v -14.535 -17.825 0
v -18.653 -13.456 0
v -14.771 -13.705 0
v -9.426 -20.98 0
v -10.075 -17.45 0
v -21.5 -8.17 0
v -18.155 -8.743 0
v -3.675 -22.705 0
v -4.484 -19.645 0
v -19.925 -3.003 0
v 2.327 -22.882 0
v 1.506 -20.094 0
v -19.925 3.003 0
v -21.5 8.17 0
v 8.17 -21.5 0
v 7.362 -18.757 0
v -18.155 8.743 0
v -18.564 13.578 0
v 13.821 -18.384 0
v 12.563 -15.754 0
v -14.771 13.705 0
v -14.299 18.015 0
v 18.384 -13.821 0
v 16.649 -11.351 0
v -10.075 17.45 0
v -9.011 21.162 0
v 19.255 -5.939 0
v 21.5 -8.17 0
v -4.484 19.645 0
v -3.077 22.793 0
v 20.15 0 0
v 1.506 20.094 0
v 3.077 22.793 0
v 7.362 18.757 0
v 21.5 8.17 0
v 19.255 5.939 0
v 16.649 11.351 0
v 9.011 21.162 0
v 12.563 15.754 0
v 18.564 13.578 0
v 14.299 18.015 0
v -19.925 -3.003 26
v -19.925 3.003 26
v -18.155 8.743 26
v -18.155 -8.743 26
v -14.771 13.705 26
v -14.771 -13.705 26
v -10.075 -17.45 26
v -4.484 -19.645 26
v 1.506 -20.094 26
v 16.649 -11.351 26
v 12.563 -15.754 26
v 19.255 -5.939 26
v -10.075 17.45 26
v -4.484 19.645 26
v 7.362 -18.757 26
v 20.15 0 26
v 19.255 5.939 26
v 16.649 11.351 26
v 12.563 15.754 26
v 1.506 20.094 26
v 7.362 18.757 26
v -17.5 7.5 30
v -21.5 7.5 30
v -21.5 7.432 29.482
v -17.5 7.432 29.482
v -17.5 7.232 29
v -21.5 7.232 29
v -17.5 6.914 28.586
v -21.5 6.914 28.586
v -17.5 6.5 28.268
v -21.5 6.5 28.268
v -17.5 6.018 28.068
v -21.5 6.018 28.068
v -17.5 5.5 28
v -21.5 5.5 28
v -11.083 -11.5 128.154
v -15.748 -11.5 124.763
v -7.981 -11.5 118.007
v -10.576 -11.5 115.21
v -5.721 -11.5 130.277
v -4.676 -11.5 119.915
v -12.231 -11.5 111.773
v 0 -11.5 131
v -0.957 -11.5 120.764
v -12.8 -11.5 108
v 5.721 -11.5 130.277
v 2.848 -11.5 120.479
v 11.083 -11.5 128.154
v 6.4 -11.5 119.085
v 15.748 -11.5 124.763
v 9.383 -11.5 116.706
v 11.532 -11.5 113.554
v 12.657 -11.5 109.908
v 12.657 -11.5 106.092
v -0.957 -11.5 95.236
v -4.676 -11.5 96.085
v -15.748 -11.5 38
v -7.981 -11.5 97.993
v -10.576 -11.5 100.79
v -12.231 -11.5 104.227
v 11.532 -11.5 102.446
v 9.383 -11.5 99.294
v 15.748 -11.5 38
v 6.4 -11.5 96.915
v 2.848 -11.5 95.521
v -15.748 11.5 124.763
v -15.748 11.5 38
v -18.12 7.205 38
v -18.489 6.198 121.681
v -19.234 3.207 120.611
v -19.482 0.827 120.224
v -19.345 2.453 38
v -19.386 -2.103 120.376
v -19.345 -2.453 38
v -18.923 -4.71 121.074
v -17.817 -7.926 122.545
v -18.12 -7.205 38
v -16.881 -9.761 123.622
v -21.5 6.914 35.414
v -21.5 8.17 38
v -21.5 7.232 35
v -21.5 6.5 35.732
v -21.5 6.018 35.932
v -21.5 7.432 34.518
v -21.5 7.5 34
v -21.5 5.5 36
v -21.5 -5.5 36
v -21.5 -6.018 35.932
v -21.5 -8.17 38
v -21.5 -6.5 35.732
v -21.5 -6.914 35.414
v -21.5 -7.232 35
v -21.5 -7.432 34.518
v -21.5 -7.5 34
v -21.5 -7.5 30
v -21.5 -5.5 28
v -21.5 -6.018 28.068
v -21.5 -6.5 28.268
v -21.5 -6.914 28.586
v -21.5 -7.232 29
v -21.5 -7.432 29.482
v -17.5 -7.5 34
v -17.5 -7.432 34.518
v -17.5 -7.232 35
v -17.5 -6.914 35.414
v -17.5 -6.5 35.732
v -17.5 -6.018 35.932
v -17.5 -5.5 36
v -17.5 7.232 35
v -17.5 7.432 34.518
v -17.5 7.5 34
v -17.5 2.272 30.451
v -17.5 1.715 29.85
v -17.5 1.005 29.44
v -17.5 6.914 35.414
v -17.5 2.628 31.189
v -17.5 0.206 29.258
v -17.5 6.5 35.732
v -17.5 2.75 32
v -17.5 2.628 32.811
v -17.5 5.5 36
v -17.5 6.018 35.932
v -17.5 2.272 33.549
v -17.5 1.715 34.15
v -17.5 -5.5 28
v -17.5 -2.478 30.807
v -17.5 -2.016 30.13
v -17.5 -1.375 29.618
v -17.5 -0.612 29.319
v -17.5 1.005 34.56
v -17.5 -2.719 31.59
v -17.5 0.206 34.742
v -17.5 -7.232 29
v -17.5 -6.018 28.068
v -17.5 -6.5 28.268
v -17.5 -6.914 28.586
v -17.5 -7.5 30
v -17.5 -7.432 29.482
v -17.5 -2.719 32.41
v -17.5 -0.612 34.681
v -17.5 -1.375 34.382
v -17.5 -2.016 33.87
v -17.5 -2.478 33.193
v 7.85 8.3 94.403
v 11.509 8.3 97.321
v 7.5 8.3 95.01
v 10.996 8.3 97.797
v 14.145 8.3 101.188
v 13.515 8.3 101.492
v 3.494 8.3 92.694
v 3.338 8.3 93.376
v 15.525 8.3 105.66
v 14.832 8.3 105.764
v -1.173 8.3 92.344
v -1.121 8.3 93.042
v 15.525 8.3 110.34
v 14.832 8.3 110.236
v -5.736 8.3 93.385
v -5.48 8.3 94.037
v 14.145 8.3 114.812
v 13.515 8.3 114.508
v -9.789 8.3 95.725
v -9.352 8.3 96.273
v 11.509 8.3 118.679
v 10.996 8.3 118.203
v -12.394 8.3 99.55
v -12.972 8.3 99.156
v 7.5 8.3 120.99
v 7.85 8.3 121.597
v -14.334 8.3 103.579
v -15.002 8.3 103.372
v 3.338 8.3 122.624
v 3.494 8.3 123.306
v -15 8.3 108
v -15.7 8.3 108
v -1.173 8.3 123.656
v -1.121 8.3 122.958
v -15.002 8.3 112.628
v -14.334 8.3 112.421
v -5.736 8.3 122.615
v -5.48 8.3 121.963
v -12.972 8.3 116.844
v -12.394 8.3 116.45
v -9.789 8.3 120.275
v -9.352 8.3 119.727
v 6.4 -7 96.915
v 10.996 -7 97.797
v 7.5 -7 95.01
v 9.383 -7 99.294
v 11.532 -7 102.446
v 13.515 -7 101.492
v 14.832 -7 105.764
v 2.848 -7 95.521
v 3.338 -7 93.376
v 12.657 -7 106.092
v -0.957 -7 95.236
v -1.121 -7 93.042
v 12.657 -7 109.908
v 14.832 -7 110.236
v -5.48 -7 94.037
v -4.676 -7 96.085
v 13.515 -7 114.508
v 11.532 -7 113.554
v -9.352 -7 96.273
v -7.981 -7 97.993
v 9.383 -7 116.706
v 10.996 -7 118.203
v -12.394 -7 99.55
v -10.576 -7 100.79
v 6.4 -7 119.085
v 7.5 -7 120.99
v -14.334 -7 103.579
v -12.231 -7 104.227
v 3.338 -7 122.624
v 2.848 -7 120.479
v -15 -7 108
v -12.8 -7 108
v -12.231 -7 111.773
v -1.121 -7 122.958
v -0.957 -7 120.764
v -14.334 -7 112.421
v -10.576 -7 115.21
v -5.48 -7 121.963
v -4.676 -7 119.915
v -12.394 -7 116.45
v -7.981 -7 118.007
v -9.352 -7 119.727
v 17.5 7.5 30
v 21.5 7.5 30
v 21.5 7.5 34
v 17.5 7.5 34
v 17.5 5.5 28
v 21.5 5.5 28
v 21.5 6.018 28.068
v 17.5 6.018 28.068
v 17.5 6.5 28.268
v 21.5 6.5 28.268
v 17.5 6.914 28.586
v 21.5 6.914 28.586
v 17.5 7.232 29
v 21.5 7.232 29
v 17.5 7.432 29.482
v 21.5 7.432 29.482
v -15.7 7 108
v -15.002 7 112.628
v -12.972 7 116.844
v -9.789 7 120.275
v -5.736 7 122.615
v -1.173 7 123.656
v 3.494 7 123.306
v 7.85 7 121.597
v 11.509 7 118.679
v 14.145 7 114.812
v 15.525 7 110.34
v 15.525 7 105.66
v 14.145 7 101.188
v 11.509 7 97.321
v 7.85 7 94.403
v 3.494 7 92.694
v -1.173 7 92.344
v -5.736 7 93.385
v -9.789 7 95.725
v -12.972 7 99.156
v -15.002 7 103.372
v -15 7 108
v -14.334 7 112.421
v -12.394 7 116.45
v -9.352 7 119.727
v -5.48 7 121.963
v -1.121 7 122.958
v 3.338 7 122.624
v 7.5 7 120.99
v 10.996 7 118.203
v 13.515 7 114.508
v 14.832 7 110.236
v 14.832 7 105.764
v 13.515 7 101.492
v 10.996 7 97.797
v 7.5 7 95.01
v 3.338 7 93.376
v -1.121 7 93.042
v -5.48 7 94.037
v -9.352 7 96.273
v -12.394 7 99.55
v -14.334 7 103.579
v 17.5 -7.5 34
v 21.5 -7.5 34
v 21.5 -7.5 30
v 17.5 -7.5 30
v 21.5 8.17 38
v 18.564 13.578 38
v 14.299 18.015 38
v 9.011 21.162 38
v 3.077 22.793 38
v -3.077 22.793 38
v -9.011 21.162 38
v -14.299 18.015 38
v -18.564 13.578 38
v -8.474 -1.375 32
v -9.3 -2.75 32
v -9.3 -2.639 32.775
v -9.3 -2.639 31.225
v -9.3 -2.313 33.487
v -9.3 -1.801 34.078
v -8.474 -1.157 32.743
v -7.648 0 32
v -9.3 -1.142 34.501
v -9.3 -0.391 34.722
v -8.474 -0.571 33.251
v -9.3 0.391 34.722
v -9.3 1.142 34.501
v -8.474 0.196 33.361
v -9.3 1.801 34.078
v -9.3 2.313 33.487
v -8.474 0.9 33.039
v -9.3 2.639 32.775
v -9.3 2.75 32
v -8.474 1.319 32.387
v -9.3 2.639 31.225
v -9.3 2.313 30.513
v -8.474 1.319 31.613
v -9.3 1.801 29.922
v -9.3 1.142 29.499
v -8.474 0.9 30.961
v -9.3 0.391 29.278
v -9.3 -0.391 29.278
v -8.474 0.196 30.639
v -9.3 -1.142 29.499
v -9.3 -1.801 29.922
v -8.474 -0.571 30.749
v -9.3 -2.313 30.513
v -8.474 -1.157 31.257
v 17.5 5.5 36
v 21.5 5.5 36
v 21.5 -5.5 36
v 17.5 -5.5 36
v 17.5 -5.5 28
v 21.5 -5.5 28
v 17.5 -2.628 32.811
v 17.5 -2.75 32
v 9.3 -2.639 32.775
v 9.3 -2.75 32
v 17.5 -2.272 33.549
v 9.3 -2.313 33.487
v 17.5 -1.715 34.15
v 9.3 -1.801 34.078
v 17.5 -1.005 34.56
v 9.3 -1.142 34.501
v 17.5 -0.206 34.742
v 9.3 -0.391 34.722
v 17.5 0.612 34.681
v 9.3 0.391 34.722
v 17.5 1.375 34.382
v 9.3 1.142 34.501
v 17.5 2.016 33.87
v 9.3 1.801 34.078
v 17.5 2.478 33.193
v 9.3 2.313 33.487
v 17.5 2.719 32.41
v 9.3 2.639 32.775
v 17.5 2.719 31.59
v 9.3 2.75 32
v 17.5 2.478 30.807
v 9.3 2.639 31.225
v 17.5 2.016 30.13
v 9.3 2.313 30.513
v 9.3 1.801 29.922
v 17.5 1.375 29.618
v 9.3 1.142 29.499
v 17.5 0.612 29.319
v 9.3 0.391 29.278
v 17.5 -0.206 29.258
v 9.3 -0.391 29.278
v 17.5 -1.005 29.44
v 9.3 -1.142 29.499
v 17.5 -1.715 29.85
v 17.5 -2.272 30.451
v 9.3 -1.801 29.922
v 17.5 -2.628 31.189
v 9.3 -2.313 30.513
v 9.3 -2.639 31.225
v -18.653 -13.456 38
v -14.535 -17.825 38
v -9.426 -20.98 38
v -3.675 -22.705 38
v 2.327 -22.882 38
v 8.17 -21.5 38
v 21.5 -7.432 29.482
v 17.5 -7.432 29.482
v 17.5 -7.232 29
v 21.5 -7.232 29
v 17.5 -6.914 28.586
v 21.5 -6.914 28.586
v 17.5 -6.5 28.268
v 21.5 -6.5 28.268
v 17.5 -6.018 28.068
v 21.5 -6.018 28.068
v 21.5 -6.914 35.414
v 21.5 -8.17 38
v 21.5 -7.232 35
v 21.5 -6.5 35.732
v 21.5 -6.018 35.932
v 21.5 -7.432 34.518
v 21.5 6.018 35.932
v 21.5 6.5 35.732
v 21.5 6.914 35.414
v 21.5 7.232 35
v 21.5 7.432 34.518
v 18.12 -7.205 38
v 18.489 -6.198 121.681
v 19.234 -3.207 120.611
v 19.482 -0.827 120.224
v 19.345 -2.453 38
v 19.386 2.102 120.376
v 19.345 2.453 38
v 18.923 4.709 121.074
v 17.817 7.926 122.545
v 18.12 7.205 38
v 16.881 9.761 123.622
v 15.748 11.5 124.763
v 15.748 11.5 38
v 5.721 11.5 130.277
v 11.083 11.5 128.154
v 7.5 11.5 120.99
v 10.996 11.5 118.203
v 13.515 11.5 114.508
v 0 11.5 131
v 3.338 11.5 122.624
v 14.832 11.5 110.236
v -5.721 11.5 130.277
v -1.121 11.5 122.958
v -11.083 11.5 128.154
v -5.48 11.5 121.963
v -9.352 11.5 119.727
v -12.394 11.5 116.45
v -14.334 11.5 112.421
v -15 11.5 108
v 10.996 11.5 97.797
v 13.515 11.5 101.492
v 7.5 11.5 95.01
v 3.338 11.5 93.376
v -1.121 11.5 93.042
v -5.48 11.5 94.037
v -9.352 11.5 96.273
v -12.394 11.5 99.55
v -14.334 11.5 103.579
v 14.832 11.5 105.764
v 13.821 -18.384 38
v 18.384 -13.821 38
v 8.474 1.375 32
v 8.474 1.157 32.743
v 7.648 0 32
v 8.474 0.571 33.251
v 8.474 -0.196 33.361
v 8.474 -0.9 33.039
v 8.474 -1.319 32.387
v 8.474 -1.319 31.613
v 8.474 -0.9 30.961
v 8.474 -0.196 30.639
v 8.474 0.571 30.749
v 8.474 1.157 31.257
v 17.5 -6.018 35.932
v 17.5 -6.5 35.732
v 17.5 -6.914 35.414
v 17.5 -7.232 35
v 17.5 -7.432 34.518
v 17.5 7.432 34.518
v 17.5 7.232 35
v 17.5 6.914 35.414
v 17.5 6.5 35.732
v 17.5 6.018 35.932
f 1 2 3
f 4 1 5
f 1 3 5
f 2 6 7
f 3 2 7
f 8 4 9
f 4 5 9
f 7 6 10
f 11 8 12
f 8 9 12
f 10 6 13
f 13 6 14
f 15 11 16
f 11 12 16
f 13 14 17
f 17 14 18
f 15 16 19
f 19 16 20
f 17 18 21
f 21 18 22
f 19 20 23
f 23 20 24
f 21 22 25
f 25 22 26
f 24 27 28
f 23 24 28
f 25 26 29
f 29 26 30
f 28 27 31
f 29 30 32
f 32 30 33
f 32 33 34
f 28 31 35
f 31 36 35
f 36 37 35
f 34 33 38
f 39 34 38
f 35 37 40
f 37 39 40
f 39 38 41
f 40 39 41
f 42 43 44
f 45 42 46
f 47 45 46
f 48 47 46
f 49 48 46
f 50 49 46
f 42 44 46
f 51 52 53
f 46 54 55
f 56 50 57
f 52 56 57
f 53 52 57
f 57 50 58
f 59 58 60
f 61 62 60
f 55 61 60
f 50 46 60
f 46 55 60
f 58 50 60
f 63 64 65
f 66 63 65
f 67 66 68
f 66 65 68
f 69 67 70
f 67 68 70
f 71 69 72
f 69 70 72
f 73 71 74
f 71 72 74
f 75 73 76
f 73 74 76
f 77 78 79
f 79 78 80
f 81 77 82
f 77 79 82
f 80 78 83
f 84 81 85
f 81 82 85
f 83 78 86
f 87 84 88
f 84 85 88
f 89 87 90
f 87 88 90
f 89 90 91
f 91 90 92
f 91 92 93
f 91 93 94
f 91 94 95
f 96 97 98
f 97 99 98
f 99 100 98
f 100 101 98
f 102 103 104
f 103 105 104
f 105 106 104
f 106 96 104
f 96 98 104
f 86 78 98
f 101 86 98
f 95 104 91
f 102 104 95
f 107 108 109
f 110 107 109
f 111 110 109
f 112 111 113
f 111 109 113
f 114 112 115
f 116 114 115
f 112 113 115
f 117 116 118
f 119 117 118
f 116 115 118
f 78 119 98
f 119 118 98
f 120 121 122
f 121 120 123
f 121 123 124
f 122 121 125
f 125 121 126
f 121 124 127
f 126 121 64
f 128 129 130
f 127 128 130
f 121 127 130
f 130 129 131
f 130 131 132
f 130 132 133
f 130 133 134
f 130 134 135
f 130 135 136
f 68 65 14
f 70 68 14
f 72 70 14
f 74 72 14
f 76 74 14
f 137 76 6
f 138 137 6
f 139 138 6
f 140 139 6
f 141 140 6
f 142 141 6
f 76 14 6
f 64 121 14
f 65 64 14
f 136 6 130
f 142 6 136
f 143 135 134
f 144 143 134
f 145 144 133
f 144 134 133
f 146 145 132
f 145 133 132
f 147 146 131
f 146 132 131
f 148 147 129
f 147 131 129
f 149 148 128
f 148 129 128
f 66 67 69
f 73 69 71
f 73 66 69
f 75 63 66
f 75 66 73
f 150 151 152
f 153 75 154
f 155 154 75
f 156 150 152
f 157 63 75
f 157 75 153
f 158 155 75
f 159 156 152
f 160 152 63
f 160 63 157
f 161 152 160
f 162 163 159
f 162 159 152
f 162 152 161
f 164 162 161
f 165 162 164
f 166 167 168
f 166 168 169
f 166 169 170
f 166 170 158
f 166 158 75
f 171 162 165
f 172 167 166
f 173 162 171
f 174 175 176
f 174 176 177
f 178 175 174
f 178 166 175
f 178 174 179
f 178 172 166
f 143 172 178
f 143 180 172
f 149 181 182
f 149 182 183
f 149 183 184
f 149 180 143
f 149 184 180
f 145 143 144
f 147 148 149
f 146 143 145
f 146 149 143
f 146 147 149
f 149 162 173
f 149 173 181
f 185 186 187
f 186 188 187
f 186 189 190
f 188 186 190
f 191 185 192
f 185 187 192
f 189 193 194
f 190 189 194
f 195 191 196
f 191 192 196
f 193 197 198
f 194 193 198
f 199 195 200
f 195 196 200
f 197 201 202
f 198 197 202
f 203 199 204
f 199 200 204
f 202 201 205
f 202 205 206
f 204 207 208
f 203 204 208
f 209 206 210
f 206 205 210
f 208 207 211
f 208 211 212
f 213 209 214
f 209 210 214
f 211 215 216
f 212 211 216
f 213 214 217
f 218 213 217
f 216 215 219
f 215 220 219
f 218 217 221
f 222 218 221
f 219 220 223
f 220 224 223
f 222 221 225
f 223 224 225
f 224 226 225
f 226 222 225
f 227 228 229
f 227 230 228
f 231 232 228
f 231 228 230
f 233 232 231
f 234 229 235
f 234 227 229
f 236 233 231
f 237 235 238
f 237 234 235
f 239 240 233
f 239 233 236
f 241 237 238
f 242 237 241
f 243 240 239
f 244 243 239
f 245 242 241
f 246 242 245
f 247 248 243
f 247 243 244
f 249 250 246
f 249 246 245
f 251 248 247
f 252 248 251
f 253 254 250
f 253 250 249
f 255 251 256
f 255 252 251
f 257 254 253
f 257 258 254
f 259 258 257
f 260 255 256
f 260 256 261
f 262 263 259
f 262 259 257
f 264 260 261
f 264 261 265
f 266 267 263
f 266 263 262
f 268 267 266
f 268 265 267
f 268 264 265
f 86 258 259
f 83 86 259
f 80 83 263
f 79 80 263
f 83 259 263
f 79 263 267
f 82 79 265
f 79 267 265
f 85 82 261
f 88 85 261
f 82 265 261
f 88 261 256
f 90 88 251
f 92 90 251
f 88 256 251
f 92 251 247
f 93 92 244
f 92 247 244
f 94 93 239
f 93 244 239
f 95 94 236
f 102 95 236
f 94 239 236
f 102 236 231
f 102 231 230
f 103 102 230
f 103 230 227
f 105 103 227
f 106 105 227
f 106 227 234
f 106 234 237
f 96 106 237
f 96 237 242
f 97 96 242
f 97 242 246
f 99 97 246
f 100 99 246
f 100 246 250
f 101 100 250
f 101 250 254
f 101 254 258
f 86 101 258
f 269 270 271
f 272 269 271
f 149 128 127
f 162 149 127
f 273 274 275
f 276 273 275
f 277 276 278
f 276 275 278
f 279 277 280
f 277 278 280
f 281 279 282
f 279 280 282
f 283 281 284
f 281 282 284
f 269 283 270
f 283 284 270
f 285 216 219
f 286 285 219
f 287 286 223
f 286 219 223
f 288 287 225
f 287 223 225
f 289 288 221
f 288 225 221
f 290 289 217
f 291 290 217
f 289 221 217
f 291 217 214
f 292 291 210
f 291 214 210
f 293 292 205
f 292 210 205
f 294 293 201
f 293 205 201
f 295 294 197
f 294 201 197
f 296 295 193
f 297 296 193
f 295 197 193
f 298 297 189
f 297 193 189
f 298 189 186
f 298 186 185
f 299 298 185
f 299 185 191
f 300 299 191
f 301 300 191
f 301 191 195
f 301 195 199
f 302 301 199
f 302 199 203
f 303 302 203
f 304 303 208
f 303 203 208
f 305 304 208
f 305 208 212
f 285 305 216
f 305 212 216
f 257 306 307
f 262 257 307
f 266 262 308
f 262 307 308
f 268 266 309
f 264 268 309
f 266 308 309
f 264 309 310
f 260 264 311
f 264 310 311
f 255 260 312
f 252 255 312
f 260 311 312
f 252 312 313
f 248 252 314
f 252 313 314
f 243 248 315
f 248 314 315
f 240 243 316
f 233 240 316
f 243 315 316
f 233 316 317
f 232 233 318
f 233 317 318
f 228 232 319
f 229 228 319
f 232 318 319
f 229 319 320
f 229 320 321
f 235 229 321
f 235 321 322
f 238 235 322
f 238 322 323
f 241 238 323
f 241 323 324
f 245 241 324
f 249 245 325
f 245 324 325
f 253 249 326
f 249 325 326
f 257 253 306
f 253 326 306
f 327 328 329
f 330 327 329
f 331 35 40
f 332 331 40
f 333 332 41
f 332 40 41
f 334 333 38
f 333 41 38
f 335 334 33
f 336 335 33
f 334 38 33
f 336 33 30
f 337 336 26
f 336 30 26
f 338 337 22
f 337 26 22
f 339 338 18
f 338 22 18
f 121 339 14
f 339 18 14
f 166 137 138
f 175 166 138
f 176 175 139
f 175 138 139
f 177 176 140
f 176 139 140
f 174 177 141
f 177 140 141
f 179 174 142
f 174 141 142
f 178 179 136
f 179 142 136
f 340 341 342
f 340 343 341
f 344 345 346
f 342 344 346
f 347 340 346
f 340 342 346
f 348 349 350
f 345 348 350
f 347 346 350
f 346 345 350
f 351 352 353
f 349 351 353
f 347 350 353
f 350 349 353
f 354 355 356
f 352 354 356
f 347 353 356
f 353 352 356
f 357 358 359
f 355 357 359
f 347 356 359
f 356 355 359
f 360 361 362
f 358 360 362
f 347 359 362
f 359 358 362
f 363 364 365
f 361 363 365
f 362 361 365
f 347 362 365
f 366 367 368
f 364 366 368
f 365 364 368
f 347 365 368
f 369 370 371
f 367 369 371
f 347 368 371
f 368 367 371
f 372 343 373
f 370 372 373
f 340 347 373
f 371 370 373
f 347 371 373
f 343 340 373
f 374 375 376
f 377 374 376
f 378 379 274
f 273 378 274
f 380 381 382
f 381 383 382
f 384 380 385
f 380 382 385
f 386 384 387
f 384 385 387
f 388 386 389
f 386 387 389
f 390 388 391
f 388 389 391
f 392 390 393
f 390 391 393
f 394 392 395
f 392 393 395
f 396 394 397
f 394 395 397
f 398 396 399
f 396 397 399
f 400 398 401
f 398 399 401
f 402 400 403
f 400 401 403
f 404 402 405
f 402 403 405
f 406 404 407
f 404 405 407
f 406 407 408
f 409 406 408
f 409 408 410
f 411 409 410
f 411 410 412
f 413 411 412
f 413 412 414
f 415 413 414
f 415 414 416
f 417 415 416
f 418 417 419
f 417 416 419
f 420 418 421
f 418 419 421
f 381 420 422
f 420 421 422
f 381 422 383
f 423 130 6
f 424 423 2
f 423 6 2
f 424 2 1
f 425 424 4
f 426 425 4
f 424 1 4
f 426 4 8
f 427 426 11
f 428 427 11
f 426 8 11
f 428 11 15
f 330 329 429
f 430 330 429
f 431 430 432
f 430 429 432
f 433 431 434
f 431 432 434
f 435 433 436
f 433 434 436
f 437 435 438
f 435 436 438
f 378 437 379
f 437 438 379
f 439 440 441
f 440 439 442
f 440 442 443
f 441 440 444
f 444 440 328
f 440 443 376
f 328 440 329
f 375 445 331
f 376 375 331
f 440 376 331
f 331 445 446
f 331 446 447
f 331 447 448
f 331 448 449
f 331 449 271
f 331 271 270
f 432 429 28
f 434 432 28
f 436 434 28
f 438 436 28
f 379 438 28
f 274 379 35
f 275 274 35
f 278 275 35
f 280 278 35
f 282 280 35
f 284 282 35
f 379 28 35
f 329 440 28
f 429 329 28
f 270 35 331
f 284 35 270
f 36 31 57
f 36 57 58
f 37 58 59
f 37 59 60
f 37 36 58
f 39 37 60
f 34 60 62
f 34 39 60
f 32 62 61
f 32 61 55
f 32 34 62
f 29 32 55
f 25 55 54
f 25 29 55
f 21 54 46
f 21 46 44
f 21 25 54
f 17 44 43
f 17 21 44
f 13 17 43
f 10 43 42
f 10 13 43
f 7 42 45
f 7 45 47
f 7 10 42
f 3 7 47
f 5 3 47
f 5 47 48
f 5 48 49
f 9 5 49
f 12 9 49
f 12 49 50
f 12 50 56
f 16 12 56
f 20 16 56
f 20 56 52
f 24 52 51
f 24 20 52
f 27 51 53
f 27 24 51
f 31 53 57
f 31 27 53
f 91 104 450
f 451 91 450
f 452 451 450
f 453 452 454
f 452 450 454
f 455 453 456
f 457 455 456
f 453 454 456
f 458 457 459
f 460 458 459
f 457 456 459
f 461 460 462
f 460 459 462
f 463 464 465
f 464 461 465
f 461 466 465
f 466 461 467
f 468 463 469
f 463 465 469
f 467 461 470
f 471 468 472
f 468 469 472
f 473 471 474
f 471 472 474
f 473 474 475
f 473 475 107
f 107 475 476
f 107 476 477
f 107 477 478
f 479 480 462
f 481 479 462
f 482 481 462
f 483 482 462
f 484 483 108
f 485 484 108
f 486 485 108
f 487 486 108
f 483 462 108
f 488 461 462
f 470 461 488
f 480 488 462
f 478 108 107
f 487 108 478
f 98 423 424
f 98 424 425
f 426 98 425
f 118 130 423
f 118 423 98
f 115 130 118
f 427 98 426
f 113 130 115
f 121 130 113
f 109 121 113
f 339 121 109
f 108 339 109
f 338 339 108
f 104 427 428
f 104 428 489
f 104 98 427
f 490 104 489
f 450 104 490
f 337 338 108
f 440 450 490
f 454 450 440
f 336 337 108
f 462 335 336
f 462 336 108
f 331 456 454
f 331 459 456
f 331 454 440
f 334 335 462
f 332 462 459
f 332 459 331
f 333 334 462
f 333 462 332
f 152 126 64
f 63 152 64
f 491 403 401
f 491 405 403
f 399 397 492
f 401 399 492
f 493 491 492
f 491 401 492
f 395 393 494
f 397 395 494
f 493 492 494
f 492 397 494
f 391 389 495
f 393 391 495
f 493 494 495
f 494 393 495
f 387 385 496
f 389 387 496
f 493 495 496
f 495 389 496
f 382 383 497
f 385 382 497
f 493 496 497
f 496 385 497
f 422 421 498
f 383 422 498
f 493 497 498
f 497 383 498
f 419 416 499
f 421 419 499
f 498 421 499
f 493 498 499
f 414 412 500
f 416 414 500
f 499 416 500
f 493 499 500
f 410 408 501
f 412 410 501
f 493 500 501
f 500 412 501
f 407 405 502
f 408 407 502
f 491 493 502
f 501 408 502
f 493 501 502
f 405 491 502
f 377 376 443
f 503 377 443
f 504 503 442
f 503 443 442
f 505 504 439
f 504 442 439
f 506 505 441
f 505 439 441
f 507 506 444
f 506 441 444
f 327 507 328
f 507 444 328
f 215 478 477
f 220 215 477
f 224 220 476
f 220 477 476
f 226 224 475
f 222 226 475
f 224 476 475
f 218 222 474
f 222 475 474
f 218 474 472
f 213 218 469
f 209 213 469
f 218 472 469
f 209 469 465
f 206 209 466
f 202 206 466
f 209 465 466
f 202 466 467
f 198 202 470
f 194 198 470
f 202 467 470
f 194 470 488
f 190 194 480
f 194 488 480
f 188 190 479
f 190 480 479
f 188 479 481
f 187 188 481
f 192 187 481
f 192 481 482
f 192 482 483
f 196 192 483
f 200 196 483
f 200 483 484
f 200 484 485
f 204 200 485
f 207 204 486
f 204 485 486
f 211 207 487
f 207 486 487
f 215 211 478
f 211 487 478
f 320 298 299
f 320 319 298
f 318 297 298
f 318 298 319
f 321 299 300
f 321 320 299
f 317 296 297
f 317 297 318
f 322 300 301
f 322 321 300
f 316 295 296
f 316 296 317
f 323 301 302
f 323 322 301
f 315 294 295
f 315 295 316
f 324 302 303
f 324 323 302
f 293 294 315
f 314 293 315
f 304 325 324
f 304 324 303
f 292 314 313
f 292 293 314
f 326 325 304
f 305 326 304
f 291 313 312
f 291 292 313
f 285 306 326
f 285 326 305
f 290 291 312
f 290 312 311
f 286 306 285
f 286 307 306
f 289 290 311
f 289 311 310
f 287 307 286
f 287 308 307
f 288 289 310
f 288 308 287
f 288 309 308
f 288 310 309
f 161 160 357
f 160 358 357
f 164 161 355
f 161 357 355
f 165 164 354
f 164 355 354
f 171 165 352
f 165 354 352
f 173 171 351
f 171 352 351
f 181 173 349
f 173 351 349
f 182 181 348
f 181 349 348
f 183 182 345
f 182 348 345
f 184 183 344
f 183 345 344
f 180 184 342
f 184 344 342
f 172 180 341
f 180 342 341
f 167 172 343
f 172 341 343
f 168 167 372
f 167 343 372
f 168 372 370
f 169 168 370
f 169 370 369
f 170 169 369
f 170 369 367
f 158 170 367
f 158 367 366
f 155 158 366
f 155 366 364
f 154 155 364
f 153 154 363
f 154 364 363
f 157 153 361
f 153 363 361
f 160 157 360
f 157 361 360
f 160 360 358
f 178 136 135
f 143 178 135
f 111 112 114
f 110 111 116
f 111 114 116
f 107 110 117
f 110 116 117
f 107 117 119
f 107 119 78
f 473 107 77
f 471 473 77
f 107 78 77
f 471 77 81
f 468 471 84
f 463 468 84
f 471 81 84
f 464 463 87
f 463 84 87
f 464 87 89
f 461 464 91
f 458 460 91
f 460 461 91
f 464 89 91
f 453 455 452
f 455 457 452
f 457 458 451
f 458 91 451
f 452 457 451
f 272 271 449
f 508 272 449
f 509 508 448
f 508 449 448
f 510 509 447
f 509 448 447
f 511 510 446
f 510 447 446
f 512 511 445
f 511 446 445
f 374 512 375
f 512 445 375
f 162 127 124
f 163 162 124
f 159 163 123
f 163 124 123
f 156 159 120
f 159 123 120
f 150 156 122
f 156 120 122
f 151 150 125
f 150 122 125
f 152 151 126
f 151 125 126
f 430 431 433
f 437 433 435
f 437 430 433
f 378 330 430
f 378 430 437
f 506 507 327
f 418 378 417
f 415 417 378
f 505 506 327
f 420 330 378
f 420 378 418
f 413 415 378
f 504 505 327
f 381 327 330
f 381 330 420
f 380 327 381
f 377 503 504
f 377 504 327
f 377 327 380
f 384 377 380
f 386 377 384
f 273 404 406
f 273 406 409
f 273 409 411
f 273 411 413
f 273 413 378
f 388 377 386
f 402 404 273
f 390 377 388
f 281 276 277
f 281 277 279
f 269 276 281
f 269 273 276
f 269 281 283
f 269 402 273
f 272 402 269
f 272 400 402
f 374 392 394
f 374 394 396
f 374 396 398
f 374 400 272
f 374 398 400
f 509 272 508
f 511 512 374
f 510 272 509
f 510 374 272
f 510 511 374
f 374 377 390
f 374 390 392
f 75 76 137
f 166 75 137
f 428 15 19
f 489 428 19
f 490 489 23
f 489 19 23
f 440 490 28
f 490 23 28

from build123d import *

# Parameters (mm, degrees)
F1_DEPTH  = 38
F2_R      = 20.15
F3_DEPTH  = 26
F5_DEPTH  = 93
F7_DEPTH  = 12.5
F8_R      = 15
F9_DEPTH  = 3.2
F10_R     = 15.7
F11_DEPTH = 1.3
F12_R     = 15
F13_DEPTH = 14
F14_R     = 12.8
F15_DEPTH = 16.001
F17_DEPTH = 4
F19_D     = 5.5
F19_DEPTH = 8.2
F19_TIP   = 1.6523667023
F21_DEPTH = 4
F23_D     = 5.5
F23_DEPTH = 8.2
F23_TIP   = 1.6523667023


with BuildPart() as f1:
    # F0 (on Top) → F1 (new body)
    with BuildSketch(Plane.XY):
        with BuildLine():
            ThreePointArc((8.1700673192, 21.5), (0, 23), (-8.1700673192, 21.5))
            ThreePointArc((-8.1700673192, 21.5), (-16.2634559673, 16.2634559673), (-21.5, 8.1700673192))
            Line((-21.5, 8.1700673192), (-21.5, -8.1700673192))
            ThreePointArc((-21.5, -8.1700673192), (-16.2634559673, -16.2634559673), (-8.1700673192, -21.5))
            ThreePointArc((-8.1700673192, -21.5), (0, -23), (8.1700673192, -21.5))
            ThreePointArc((8.1700673192, -21.5), (16.2634559673, -16.2634559673), (21.5, -8.1700673192))
            Line((21.5, -8.1700673192), (21.5, 8.1700673192))
            ThreePointArc((21.5, 8.1700673192), (16.2634559673, 16.2634559673), (8.1700673192, 21.5))
        make_face()
    extrude(amount=F1_DEPTH)

    # F2 (on Top) → F3 (cut)
    with BuildSketch(Plane.XY):
        Circle(F2_R)
    extrude(amount=F3_DEPTH, mode=Mode.SUBTRACT)

    # F4 (on face) → F5 (join)
    with BuildSketch(Plane.XY.offset(38)):
        with BuildLine():
            Line((15.748015748, 11.5), (-15.748015748, 11.5))
            ThreePointArc((-15.748015748, 11.5), (-19.5, 0), (-15.748015748, -11.5))
            Line((-15.748015748, -11.5), (15.748015748, -11.5))
            ThreePointArc((15.748015748, -11.5), (19.5, 0), (15.748015748, 11.5))
        make_face()
    extrude(amount=F5_DEPTH)

    # F6 (on Front) → F7 (cut, symmetric)
    with BuildSketch(Plane.XZ):
        with BuildLine():
            ThreePointArc((-22.9993669171, 108.1706499767), (-1.4508057769, 130.9541970584), (22.7948567954, 111.0650454609))
            Line((22.7948567954, 111.0650454609), (28.0992928892, 135.5375498533))
            Line((28.0992928892, 135.5375498533), (-36.6138778627, 135.5375498533))
            Line((-36.6138778627, 135.5375498533), (-22.9993669171, 108.1706499767))
        make_face()
    extrude(amount=F7_DEPTH, both=True, mode=Mode.SUBTRACT)

    # F8 (on face) → F9 (cut)
    with BuildSketch(Plane(origin=(0, 11.5, 0), x_dir=(-1, 0, 0), z_dir=(0, 1, 0))):
        with Locations((0, 108)):
            Circle(F8_R)
    extrude(amount=-F9_DEPTH, mode=Mode.SUBTRACT)

    # F10 (on face) → F11 (cut)
    with BuildSketch(Plane(origin=(0, 8.3, 0), x_dir=(-1, 0, 0), z_dir=(0, 1, 0))):
        with Locations((0, 108)):
            Circle(F10_R)
    extrude(amount=-F11_DEPTH, mode=Mode.SUBTRACT)

    # F12 (on face) → F13 (cut)
    with BuildSketch(Plane(origin=(0, 7, 0), x_dir=(-1, 0, 0), z_dir=(0, 1, 0))):
        with Locations((0, 108)):
            Circle(F12_R)
    extrude(amount=-F13_DEPTH, mode=Mode.SUBTRACT)

    # F14 (on face) → F15 (cut, through all)
    with BuildSketch(Plane(origin=(0, -7, 0), x_dir=(-1, 0, 0), z_dir=(0, 1, 0))):
        with Locations((0, 108)):
            Circle(F14_R)
    extrude(amount=-F15_DEPTH, mode=Mode.SUBTRACT)

    # F16 (on face) → F17 (cut)
    with BuildSketch(Plane.YZ.offset(21.5)):
        with BuildLine():
            Line((5.5, 36), (-5.5, 36))
            ThreePointArc((-5.5, 36), (-6.9142135624, 35.4142135624), (-7.5, 34))
            Line((-7.5, 34), (-7.5, 30))
            ThreePointArc((-7.5, 30), (-6.9142135624, 28.5857864376), (-5.5, 28))
            Line((-5.5, 28), (5.5, 28))
            ThreePointArc((5.5, 28), (6.9142135624, 28.5857864376), (7.5, 30))
            Line((7.5, 30), (7.5, 34))
            ThreePointArc((7.5, 34), (6.9142135624, 35.4142135624), (5.5, 36))
        make_face()
    extrude(amount=-F17_DEPTH, mode=Mode.SUBTRACT)

    # F19
    with Locations(Plane.YZ.offset(17.5)):
        with Locations((0, 32)):
            Hole(F19_D / 2, depth=F19_DEPTH)
            with Locations((0, 0, -(F19_DEPTH + F19_TIP / 2))):  # 118° drill point
                Cone(0, F19_D / 2, F19_TIP, mode=Mode.SUBTRACT)

    # F20 (on face) → F21 (cut)
    with BuildSketch(Plane(origin=(-21.5, 0, 0), x_dir=(0, -1, 0), z_dir=(-1, 0, 0))):
        with BuildLine():
            Line((5.5, 36), (-5.5, 36))
            ThreePointArc((-5.5, 36), (-6.9142135624, 35.4142135624), (-7.5, 34))
            Line((-7.5, 34), (-7.5, 30))
            ThreePointArc((-7.5, 30), (-6.9142135624, 28.5857864376), (-5.5, 28))
            Line((-5.5, 28), (5.5, 28))
            ThreePointArc((5.5, 28), (6.9142135624, 28.5857864376), (7.5, 30))
            Line((7.5, 30), (7.5, 34))
            ThreePointArc((7.5, 34), (6.9142135624, 35.4142135624), (5.5, 36))
        make_face()
    extrude(amount=-F21_DEPTH, mode=Mode.SUBTRACT)

    # F23
    with Locations(Plane(origin=(-17.5, 0, 0), x_dir=(0, -1, 0), z_dir=(-1, 0, 0))):
        with Locations((0, 32)):
            Hole(F23_D / 2, depth=F23_DEPTH)
            with Locations((0, 0, -(F23_DEPTH + F23_TIP / 2))):  # 118° drill point
                Cone(0, F23_D / 2, F23_TIP, mode=Mode.SUBTRACT)


solid = f1.part
